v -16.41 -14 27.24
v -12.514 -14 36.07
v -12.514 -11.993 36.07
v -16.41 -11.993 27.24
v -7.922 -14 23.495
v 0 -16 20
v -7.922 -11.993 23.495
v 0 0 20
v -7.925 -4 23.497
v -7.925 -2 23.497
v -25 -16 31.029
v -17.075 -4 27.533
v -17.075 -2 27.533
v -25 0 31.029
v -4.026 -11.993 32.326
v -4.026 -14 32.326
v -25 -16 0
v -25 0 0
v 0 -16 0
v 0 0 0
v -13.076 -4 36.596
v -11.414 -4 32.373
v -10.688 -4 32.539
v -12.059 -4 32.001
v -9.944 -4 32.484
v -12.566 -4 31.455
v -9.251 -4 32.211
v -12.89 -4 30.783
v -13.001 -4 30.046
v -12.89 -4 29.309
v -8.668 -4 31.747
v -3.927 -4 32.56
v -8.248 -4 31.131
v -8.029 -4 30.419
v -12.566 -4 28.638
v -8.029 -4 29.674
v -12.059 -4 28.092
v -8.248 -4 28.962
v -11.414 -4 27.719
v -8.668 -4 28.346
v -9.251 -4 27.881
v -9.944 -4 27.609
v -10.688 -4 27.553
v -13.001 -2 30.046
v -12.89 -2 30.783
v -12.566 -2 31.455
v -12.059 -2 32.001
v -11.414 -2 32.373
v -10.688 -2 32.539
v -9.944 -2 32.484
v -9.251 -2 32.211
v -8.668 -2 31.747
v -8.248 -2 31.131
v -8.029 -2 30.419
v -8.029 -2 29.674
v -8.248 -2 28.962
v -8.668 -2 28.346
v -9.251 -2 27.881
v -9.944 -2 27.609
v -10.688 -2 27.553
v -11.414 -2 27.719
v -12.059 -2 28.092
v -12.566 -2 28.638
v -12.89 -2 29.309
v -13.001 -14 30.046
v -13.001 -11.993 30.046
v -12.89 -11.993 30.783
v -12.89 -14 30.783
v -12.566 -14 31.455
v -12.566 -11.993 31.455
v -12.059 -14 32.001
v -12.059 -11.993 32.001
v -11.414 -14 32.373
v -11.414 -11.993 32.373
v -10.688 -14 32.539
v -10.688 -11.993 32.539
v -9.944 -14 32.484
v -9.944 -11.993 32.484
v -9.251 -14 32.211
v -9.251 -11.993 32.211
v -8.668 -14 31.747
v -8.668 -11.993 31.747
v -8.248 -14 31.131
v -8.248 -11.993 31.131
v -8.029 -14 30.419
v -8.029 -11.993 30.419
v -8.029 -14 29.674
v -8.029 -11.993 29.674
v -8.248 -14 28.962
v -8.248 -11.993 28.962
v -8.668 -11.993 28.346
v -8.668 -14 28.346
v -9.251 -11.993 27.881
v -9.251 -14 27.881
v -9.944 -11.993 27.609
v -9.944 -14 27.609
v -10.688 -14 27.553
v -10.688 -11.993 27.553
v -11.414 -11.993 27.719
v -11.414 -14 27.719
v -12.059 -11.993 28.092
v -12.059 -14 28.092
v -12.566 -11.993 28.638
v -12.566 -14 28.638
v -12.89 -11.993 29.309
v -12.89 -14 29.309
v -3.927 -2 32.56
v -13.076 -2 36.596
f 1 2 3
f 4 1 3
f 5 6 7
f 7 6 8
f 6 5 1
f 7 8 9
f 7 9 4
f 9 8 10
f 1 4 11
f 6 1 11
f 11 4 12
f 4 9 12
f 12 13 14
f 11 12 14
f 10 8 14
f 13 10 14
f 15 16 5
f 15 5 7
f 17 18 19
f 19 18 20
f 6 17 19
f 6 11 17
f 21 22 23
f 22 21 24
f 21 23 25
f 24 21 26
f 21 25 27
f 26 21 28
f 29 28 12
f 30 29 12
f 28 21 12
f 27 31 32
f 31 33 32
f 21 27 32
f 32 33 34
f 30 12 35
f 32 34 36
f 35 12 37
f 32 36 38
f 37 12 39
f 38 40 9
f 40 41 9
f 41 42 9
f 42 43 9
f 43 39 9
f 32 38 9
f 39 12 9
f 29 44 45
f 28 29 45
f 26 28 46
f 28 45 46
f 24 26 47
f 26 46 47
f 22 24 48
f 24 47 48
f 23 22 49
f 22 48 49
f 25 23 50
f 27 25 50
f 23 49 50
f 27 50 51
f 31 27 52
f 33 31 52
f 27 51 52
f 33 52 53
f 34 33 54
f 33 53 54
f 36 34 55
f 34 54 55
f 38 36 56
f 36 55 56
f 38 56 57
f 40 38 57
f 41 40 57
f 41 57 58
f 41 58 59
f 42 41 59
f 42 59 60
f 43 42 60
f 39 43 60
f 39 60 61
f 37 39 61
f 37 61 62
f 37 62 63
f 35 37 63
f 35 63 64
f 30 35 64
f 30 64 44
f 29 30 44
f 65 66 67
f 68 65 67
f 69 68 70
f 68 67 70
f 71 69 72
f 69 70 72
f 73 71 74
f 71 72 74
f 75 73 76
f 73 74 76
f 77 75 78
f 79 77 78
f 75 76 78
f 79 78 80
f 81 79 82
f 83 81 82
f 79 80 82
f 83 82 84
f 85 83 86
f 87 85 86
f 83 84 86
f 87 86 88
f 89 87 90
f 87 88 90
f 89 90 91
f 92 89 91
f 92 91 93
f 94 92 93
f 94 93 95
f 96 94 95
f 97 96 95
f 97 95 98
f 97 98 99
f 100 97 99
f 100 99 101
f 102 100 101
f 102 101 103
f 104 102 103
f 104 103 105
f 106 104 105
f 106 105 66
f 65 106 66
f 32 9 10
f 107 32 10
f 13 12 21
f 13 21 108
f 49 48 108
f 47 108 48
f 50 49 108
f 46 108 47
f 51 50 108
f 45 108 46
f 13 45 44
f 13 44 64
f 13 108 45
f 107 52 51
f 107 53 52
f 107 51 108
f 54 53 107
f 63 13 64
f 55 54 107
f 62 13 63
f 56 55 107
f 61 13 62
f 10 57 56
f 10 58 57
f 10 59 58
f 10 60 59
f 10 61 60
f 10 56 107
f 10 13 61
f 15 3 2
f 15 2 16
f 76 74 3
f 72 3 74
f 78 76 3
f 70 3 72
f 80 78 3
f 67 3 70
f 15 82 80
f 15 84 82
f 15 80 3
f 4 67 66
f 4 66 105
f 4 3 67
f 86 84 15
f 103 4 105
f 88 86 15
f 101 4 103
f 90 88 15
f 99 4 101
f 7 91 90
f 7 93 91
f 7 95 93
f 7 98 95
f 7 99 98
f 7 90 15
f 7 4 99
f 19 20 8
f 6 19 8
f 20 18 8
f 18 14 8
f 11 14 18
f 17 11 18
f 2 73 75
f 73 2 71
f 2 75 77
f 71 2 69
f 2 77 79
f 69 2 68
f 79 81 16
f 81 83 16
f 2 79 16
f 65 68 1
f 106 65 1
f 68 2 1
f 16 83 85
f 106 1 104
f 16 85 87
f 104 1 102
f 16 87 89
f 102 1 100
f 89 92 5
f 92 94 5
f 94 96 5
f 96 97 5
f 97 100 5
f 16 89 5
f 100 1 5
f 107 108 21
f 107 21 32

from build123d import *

# Parameters (mm, degrees)
F1_DEPTH = 16
F2_W     = 10
F2_H     = 2
F3_DEPTH = 9.906
F2_W_2   = 9.277396
F2_H_2   = 2.0066
F4_DEPTH = 9.652
F5_R     = 2.5
F6_DEPTH = 17.5006


with BuildPart() as f1:
    # F0 (on Front) → F1 (new body)
    with BuildSketch(Plane.XZ):
        Polygon((-25, 0), (0, 0), (0, 20), (-25, 31.029411), align=None)
    extrude(amount=F1_DEPTH)

    # F2 (on face) → F3 (join)
    with BuildSketch(Plane(origin=(7.385952, 0, 16.741492), x_dir=(0.914918, 0, -0.40364), z_dir=(0.40364, 0, 0.914918))):
        with Locations((-21.735233, -3)):
            Rectangle(F2_W, F2_H)
    extrude(amount=F3_DEPTH)

    # F2 (on face) → F4 (join)
    with BuildSketch(Plane(origin=(7.385952, 0, 16.741492), x_dir=(0.914918, 0, -0.40364), z_dir=(0.40364, 0, 0.914918))):
        with Locations((-21.735233, -3)):
            Rectangle(F2_W, F2_H)
        with Locations((-21.370131, -12.9967)):
            Rectangle(F2_W_2, F2_H_2)
    extrude(amount=F4_DEPTH)

    # F5 (on face) → F6 (cut)
    with BuildSketch(Plane(origin=(0, -2, 0), x_dir=(-1, 0, 0), z_dir=(0, 1, 0))):
        with Locations((10.50077, 30.046294)):
            Circle(F5_R)
    extrude(amount=-F6_DEPTH, mode=Mode.SUBTRACT)


solid = f1.part
